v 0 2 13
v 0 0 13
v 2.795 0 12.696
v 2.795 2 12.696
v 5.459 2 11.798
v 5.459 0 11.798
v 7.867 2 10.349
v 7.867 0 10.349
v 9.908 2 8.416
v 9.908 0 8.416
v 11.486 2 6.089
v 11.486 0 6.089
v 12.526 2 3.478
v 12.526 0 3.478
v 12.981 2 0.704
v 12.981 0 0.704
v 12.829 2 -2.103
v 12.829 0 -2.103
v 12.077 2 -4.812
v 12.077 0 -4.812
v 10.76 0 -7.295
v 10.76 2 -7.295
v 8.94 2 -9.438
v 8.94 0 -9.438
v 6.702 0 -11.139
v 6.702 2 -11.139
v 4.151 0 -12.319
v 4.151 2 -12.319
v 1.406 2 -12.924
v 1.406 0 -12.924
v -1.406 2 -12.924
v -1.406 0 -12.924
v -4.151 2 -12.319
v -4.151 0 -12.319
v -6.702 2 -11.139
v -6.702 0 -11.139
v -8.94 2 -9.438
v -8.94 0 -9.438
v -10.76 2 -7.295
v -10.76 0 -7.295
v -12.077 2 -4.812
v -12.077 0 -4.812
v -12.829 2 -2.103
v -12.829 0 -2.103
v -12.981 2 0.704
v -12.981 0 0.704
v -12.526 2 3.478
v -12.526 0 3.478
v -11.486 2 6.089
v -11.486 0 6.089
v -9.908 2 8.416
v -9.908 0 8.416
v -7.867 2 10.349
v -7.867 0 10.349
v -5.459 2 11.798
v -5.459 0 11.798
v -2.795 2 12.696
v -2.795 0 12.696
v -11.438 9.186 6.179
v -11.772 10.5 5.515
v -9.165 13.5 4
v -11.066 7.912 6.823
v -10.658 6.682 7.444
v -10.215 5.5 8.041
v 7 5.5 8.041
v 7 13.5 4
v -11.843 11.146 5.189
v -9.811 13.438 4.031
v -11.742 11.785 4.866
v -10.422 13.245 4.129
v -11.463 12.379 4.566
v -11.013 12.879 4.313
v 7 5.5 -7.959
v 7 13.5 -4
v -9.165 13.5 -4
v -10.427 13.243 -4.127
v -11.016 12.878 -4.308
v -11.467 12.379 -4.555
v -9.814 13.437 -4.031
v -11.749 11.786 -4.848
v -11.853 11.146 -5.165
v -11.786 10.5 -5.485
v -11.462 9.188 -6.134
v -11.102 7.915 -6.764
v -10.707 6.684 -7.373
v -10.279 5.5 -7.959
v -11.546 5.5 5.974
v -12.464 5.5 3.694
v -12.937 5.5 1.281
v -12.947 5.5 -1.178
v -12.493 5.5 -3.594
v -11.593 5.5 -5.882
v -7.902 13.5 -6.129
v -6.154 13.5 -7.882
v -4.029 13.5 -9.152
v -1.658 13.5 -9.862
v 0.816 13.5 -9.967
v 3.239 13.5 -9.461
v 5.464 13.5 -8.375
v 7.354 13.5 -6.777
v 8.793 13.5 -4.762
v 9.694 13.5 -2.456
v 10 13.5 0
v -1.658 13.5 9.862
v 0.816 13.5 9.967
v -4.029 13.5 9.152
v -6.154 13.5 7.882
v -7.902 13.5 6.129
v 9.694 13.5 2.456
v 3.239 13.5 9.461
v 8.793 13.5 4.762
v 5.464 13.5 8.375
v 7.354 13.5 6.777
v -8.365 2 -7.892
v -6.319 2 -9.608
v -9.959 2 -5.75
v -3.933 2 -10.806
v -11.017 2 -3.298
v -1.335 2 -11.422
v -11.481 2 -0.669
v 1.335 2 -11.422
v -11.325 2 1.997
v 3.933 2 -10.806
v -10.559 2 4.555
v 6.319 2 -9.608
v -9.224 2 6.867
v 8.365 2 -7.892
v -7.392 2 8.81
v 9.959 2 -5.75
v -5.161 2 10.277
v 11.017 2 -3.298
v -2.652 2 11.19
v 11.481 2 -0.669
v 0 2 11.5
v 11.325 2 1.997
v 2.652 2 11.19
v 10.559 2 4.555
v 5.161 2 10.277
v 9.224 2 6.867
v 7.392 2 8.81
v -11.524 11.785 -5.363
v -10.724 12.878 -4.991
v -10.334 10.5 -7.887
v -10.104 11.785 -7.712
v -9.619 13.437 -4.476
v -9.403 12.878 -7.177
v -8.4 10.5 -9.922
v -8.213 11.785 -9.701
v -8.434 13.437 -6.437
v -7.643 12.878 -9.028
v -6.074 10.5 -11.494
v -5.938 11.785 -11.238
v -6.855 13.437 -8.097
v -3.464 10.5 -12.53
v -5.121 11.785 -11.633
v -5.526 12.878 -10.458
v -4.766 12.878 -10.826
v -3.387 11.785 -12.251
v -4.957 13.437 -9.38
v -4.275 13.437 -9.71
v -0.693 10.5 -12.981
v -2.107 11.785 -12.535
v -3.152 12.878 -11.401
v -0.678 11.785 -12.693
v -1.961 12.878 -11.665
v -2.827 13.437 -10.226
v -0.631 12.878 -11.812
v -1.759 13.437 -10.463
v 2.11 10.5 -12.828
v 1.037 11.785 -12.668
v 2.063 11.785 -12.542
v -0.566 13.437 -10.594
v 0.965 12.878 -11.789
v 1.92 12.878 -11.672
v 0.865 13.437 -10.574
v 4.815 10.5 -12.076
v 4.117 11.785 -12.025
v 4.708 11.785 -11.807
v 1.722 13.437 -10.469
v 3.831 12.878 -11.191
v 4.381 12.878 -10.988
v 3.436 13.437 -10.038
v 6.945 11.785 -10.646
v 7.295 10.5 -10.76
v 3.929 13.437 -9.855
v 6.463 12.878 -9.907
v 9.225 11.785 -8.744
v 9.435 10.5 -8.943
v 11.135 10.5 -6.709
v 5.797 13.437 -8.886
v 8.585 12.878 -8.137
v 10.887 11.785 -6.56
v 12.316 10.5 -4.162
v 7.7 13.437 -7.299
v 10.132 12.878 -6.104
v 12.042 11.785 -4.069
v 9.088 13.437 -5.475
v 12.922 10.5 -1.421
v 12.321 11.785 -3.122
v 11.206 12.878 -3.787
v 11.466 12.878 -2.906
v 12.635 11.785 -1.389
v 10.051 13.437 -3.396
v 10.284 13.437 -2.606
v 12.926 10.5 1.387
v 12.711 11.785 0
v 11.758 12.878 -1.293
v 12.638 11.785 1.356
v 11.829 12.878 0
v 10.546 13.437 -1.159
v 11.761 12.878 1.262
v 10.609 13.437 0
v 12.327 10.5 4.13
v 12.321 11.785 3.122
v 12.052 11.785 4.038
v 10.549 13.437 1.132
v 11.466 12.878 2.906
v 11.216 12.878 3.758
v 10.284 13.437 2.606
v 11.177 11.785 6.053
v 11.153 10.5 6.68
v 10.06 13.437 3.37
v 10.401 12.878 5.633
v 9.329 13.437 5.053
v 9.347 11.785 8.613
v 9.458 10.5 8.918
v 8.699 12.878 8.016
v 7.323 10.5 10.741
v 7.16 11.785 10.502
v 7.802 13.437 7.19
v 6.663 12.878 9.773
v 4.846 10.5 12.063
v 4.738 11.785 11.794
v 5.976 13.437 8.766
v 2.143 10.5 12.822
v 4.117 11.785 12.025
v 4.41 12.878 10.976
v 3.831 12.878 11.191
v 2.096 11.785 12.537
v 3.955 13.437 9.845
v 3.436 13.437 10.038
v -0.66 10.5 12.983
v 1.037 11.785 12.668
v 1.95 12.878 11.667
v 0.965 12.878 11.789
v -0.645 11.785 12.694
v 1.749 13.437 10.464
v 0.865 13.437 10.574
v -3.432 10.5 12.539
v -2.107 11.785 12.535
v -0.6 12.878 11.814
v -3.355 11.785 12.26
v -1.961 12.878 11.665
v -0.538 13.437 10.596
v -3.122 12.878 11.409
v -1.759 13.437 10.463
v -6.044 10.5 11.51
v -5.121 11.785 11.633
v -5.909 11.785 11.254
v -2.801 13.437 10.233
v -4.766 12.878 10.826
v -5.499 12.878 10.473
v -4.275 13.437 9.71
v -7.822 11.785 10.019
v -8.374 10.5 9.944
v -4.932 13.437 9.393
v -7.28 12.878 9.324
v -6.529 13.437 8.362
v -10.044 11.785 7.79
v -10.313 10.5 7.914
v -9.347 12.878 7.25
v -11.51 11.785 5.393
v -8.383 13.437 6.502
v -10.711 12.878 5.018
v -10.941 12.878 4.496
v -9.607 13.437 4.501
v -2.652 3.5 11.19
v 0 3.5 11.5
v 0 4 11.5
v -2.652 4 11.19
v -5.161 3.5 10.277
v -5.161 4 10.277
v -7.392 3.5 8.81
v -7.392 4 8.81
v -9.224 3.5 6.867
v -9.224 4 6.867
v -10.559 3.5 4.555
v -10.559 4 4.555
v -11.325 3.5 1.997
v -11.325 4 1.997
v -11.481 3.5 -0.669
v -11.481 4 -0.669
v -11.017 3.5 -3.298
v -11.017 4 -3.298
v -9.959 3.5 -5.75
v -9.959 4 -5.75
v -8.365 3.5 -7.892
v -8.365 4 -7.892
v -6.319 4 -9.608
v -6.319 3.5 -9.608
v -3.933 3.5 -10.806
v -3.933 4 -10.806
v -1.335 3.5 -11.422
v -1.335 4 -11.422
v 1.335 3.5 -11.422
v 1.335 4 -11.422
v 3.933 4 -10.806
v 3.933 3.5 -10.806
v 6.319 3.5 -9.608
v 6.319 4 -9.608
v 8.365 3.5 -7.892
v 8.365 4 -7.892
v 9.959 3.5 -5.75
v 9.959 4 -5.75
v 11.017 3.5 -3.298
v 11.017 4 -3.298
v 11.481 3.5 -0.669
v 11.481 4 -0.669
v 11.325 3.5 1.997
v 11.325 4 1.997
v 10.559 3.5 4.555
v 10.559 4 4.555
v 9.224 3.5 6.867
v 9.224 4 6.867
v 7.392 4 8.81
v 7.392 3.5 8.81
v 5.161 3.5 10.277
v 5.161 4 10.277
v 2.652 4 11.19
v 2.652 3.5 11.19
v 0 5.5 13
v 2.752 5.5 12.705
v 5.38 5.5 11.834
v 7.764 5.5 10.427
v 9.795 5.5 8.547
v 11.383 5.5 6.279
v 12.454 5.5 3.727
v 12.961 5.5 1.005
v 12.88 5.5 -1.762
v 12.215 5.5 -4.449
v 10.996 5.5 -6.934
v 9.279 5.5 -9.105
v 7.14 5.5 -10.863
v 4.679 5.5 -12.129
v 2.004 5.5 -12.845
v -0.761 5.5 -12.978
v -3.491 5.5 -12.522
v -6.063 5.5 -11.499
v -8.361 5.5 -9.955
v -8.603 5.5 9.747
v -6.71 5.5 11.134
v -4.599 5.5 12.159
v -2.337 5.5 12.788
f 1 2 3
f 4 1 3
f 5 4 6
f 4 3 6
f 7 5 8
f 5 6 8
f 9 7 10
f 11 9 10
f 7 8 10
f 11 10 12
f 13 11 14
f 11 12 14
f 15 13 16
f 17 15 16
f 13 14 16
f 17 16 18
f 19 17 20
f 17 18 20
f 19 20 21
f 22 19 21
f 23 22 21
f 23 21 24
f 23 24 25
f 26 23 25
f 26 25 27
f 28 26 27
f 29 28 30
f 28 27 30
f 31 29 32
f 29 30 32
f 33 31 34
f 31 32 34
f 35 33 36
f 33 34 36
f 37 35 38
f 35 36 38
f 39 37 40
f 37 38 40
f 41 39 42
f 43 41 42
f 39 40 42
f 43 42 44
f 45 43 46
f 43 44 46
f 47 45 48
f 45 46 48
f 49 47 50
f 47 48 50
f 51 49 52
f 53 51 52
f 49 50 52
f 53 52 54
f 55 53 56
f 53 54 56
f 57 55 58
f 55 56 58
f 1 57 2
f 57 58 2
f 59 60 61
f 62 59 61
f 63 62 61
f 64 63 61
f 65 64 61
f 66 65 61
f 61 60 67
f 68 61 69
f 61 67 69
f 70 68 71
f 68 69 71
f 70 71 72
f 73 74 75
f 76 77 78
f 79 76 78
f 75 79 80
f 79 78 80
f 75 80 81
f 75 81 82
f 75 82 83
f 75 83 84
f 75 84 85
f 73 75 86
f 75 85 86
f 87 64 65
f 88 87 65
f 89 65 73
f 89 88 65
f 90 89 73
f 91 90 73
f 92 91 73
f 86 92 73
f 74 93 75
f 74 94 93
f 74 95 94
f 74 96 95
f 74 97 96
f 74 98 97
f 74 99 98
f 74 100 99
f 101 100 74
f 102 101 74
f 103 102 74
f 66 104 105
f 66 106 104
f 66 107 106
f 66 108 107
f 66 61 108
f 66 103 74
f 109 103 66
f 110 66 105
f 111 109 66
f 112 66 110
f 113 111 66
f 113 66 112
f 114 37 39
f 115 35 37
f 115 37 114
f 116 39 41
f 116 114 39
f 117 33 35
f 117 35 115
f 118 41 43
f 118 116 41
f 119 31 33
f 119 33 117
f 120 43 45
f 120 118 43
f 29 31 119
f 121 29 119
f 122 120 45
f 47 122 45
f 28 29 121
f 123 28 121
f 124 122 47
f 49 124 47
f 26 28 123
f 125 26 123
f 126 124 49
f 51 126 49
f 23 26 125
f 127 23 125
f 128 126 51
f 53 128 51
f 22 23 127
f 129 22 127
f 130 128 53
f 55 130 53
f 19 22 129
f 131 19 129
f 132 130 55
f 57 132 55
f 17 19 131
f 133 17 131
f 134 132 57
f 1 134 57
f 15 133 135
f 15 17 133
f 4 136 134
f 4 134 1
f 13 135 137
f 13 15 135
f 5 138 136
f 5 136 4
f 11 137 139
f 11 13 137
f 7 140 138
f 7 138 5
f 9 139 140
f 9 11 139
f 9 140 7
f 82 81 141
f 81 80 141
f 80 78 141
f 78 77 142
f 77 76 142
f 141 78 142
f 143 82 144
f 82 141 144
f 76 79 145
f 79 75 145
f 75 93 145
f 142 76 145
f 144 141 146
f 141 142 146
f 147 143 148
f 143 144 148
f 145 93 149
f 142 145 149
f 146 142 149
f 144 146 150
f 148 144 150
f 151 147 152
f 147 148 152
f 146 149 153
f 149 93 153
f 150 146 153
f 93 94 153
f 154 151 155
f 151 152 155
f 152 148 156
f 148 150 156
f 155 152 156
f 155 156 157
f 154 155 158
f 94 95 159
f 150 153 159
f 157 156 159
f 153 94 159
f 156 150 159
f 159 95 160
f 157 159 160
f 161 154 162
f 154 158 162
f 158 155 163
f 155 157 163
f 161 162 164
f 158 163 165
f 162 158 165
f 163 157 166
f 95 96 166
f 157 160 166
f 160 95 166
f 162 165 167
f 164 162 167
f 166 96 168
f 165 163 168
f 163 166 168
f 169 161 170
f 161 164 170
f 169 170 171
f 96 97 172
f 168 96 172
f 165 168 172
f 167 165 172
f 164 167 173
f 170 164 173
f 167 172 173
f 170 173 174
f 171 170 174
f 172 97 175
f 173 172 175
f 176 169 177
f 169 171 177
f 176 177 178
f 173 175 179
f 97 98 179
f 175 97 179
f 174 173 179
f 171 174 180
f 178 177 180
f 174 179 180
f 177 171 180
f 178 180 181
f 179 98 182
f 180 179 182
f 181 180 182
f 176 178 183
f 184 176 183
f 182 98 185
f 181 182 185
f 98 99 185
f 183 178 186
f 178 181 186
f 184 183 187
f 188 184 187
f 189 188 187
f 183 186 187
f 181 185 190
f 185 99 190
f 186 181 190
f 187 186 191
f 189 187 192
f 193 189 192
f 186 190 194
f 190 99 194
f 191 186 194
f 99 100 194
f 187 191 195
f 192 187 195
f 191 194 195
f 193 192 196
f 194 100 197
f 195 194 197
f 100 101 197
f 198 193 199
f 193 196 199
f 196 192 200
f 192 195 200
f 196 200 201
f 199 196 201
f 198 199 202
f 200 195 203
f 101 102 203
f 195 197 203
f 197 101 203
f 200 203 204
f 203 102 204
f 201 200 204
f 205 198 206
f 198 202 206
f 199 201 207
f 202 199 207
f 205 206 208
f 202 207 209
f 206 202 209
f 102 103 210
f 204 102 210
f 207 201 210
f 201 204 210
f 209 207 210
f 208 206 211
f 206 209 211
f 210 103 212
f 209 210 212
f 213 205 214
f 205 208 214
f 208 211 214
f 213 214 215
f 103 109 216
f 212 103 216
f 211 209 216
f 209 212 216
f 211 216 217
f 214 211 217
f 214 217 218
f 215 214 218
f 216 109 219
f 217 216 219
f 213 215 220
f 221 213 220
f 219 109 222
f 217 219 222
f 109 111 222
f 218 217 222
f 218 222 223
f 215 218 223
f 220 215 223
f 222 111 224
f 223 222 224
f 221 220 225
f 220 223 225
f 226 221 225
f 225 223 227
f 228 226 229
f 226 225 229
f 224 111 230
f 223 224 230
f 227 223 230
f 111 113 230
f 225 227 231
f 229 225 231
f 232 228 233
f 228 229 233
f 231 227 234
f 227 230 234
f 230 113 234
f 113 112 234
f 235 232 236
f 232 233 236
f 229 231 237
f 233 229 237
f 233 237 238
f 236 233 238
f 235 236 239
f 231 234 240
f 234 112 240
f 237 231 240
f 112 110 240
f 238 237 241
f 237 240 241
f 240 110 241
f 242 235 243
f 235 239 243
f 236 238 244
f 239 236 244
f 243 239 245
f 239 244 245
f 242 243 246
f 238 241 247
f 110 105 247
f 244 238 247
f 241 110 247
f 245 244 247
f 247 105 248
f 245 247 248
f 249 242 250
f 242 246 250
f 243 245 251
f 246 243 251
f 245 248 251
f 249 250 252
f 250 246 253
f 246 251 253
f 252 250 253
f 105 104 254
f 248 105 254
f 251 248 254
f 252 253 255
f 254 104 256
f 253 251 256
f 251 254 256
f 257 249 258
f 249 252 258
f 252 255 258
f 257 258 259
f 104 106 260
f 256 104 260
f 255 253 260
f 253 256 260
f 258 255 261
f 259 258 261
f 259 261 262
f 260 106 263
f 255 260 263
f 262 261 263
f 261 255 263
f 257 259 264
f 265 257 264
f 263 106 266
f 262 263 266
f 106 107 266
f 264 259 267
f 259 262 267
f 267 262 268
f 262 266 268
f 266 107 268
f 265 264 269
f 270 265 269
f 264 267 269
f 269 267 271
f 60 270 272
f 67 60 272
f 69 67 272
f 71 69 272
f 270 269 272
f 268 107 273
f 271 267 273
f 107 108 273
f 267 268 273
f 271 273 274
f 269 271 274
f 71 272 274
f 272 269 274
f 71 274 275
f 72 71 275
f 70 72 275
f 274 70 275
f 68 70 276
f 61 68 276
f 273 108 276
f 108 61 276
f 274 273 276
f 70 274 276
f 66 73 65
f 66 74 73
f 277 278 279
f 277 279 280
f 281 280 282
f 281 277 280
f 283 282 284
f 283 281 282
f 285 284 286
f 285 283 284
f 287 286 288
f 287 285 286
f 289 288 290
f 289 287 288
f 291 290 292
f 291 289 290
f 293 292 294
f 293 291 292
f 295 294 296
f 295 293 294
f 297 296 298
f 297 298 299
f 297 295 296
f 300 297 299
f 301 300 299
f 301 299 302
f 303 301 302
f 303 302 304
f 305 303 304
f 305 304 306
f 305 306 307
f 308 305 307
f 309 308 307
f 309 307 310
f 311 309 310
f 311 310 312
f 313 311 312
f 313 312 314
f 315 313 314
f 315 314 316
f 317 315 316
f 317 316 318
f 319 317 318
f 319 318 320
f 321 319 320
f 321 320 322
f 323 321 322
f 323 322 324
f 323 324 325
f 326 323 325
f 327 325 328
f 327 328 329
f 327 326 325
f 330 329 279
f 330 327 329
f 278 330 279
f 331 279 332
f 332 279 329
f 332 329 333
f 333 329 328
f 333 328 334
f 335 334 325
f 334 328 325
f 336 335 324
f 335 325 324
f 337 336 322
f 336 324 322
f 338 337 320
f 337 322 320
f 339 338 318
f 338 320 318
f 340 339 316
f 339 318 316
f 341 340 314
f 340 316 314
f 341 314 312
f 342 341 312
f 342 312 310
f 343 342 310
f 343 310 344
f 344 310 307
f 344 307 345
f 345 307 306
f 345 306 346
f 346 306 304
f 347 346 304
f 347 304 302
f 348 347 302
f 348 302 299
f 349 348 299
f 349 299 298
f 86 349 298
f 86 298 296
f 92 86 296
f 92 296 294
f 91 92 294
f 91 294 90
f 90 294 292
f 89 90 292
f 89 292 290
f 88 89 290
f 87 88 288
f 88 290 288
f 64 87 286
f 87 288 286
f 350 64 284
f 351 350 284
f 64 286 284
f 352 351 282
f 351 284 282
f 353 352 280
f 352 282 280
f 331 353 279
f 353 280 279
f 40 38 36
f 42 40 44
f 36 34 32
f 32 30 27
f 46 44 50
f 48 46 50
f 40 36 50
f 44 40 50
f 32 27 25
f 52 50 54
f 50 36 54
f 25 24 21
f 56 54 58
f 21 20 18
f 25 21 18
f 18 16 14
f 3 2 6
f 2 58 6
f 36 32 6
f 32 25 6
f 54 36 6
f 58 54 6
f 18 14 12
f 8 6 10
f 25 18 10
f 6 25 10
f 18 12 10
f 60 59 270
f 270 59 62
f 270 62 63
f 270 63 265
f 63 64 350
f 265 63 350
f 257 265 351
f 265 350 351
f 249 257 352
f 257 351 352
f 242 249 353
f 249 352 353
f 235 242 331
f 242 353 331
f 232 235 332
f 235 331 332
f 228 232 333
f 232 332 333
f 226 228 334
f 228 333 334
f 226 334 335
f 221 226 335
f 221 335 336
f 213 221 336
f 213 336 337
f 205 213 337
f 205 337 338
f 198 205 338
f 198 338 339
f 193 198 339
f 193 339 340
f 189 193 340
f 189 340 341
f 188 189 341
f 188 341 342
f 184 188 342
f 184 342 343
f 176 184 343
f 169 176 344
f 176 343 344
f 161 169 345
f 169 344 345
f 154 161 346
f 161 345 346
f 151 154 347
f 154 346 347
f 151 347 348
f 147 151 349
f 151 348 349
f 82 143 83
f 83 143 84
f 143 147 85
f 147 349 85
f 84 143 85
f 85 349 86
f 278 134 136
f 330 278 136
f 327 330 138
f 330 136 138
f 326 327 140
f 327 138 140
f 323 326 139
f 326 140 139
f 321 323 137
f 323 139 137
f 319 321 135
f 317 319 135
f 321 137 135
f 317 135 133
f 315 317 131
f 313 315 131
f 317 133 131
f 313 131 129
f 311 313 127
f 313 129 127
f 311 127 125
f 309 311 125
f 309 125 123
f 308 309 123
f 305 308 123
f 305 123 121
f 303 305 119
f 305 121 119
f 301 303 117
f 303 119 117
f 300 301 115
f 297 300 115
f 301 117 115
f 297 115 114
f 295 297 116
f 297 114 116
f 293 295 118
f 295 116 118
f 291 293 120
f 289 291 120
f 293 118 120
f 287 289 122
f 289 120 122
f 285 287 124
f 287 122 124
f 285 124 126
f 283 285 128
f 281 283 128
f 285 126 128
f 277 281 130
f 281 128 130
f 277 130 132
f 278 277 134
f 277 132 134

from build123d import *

# Parameters (mm, degrees)
SKETCH1_R               = 13
BOSS_EXTRUDE1_DEPTH     = 2
SKETCH2_R               = 11.5
BOSS_EXTRUDE2_DEPTH     = 1.5
SKETCH3_R               = 13
BOSS_EXTRUDE4_DEPTH     = 10
CUT_EXTRUDE1_DEPTH      = 7
CUT_EXTRUDE1_DEPTH_BACK = 23.808989456
CHAMFER1_SIZE           = 2
FILLET1_R               = 3


with BuildPart() as part:
    # Sketch1 → Boss-Extrude1 (new body)
    with BuildSketch(Plane(origin=(0, 0, 0), x_dir=(1, 0, 0), z_dir=(0, 1, 0))):
        with Locations(Location((0, 0, 0), (0, 0, 270))):
            Circle(SKETCH1_R)
    extrude(amount=BOSS_EXTRUDE1_DEPTH)

    # Sketch2 → Boss-Extrude2 (add)
    with BuildSketch(Plane(origin=(0, 2, 0), x_dir=(1, 0, 0), z_dir=(0, 1, 0))):
        with Locations(Location((0, 0, 0), (0, 0, 270))):
            Circle(SKETCH2_R)
    extrude(amount=BOSS_EXTRUDE2_DEPTH)

    # Sketch3 → Boss-Extrude4 (add)
    with BuildSketch(Plane(origin=(0, 3.5, 0), x_dir=(1, 0, 0), z_dir=(0, 1, 0))):
        with Locations(Location((0, 0, 0), (0, 0, 270))):
            Circle(SKETCH3_R)
    extrude(amount=BOSS_EXTRUDE4_DEPTH)

    # Sketch4 → Cut-Extrude1 (cut, two sides: drawn at the far end of the back side and taken through both)
    with BuildSketch(Plane(origin=(0, 0, 0), x_dir=(0, 0, -1), z_dir=(1, 0, 0)).offset(-CUT_EXTRUDE1_DEPTH_BACK)):
        Polygon((-0.040911755, 5.5), (-8.040911755, 5.5), (-4, 13.5), (0, 13.5), (4, 13.5), (7.959088245, 5.5), align=None)
    extrude(amount=CUT_EXTRUDE1_DEPTH + CUT_EXTRUDE1_DEPTH_BACK, mode=Mode.SUBTRACT)

    # Chamfer1
    # the kernel refuses this chamfer: 2 mm, written as the material it takes off along each edge
    with BuildSketch(Plane(origin=(0, 3.5, 0), x_dir=(0, 0, 1), z_dir=(-1, 0, 0))) as chamfer1_piece_1_section:
        Polygon((13, CHAMFER1_SIZE), (13 - CHAMFER1_SIZE, 0), (13, 0), align=None)
    chamfer1_piece_1 = revolve(axis=Axis((0, 3.5, 0), (0, 1, 0)), mode=Mode.PRIVATE)
    chamfer1_piece_1 = chamfer1_piece_1 - Plane(origin=(0, 4.739987211, 0), x_dir=(0, 0, 1), z_dir=(0, -1, 0)) * Cylinder(11.5, 52, mode=Mode.PRIVATE)
    add(chamfer1_piece_1, mode=Mode.SUBTRACT)

    # Fillet1
    fillet1_edges = [part.edges().sort_by_distance(p)[0] for p in [
        (13, 13.5, 0),
    ]]
    fillet(fillet1_edges, radius=FILLET1_R)


solid = part.part
